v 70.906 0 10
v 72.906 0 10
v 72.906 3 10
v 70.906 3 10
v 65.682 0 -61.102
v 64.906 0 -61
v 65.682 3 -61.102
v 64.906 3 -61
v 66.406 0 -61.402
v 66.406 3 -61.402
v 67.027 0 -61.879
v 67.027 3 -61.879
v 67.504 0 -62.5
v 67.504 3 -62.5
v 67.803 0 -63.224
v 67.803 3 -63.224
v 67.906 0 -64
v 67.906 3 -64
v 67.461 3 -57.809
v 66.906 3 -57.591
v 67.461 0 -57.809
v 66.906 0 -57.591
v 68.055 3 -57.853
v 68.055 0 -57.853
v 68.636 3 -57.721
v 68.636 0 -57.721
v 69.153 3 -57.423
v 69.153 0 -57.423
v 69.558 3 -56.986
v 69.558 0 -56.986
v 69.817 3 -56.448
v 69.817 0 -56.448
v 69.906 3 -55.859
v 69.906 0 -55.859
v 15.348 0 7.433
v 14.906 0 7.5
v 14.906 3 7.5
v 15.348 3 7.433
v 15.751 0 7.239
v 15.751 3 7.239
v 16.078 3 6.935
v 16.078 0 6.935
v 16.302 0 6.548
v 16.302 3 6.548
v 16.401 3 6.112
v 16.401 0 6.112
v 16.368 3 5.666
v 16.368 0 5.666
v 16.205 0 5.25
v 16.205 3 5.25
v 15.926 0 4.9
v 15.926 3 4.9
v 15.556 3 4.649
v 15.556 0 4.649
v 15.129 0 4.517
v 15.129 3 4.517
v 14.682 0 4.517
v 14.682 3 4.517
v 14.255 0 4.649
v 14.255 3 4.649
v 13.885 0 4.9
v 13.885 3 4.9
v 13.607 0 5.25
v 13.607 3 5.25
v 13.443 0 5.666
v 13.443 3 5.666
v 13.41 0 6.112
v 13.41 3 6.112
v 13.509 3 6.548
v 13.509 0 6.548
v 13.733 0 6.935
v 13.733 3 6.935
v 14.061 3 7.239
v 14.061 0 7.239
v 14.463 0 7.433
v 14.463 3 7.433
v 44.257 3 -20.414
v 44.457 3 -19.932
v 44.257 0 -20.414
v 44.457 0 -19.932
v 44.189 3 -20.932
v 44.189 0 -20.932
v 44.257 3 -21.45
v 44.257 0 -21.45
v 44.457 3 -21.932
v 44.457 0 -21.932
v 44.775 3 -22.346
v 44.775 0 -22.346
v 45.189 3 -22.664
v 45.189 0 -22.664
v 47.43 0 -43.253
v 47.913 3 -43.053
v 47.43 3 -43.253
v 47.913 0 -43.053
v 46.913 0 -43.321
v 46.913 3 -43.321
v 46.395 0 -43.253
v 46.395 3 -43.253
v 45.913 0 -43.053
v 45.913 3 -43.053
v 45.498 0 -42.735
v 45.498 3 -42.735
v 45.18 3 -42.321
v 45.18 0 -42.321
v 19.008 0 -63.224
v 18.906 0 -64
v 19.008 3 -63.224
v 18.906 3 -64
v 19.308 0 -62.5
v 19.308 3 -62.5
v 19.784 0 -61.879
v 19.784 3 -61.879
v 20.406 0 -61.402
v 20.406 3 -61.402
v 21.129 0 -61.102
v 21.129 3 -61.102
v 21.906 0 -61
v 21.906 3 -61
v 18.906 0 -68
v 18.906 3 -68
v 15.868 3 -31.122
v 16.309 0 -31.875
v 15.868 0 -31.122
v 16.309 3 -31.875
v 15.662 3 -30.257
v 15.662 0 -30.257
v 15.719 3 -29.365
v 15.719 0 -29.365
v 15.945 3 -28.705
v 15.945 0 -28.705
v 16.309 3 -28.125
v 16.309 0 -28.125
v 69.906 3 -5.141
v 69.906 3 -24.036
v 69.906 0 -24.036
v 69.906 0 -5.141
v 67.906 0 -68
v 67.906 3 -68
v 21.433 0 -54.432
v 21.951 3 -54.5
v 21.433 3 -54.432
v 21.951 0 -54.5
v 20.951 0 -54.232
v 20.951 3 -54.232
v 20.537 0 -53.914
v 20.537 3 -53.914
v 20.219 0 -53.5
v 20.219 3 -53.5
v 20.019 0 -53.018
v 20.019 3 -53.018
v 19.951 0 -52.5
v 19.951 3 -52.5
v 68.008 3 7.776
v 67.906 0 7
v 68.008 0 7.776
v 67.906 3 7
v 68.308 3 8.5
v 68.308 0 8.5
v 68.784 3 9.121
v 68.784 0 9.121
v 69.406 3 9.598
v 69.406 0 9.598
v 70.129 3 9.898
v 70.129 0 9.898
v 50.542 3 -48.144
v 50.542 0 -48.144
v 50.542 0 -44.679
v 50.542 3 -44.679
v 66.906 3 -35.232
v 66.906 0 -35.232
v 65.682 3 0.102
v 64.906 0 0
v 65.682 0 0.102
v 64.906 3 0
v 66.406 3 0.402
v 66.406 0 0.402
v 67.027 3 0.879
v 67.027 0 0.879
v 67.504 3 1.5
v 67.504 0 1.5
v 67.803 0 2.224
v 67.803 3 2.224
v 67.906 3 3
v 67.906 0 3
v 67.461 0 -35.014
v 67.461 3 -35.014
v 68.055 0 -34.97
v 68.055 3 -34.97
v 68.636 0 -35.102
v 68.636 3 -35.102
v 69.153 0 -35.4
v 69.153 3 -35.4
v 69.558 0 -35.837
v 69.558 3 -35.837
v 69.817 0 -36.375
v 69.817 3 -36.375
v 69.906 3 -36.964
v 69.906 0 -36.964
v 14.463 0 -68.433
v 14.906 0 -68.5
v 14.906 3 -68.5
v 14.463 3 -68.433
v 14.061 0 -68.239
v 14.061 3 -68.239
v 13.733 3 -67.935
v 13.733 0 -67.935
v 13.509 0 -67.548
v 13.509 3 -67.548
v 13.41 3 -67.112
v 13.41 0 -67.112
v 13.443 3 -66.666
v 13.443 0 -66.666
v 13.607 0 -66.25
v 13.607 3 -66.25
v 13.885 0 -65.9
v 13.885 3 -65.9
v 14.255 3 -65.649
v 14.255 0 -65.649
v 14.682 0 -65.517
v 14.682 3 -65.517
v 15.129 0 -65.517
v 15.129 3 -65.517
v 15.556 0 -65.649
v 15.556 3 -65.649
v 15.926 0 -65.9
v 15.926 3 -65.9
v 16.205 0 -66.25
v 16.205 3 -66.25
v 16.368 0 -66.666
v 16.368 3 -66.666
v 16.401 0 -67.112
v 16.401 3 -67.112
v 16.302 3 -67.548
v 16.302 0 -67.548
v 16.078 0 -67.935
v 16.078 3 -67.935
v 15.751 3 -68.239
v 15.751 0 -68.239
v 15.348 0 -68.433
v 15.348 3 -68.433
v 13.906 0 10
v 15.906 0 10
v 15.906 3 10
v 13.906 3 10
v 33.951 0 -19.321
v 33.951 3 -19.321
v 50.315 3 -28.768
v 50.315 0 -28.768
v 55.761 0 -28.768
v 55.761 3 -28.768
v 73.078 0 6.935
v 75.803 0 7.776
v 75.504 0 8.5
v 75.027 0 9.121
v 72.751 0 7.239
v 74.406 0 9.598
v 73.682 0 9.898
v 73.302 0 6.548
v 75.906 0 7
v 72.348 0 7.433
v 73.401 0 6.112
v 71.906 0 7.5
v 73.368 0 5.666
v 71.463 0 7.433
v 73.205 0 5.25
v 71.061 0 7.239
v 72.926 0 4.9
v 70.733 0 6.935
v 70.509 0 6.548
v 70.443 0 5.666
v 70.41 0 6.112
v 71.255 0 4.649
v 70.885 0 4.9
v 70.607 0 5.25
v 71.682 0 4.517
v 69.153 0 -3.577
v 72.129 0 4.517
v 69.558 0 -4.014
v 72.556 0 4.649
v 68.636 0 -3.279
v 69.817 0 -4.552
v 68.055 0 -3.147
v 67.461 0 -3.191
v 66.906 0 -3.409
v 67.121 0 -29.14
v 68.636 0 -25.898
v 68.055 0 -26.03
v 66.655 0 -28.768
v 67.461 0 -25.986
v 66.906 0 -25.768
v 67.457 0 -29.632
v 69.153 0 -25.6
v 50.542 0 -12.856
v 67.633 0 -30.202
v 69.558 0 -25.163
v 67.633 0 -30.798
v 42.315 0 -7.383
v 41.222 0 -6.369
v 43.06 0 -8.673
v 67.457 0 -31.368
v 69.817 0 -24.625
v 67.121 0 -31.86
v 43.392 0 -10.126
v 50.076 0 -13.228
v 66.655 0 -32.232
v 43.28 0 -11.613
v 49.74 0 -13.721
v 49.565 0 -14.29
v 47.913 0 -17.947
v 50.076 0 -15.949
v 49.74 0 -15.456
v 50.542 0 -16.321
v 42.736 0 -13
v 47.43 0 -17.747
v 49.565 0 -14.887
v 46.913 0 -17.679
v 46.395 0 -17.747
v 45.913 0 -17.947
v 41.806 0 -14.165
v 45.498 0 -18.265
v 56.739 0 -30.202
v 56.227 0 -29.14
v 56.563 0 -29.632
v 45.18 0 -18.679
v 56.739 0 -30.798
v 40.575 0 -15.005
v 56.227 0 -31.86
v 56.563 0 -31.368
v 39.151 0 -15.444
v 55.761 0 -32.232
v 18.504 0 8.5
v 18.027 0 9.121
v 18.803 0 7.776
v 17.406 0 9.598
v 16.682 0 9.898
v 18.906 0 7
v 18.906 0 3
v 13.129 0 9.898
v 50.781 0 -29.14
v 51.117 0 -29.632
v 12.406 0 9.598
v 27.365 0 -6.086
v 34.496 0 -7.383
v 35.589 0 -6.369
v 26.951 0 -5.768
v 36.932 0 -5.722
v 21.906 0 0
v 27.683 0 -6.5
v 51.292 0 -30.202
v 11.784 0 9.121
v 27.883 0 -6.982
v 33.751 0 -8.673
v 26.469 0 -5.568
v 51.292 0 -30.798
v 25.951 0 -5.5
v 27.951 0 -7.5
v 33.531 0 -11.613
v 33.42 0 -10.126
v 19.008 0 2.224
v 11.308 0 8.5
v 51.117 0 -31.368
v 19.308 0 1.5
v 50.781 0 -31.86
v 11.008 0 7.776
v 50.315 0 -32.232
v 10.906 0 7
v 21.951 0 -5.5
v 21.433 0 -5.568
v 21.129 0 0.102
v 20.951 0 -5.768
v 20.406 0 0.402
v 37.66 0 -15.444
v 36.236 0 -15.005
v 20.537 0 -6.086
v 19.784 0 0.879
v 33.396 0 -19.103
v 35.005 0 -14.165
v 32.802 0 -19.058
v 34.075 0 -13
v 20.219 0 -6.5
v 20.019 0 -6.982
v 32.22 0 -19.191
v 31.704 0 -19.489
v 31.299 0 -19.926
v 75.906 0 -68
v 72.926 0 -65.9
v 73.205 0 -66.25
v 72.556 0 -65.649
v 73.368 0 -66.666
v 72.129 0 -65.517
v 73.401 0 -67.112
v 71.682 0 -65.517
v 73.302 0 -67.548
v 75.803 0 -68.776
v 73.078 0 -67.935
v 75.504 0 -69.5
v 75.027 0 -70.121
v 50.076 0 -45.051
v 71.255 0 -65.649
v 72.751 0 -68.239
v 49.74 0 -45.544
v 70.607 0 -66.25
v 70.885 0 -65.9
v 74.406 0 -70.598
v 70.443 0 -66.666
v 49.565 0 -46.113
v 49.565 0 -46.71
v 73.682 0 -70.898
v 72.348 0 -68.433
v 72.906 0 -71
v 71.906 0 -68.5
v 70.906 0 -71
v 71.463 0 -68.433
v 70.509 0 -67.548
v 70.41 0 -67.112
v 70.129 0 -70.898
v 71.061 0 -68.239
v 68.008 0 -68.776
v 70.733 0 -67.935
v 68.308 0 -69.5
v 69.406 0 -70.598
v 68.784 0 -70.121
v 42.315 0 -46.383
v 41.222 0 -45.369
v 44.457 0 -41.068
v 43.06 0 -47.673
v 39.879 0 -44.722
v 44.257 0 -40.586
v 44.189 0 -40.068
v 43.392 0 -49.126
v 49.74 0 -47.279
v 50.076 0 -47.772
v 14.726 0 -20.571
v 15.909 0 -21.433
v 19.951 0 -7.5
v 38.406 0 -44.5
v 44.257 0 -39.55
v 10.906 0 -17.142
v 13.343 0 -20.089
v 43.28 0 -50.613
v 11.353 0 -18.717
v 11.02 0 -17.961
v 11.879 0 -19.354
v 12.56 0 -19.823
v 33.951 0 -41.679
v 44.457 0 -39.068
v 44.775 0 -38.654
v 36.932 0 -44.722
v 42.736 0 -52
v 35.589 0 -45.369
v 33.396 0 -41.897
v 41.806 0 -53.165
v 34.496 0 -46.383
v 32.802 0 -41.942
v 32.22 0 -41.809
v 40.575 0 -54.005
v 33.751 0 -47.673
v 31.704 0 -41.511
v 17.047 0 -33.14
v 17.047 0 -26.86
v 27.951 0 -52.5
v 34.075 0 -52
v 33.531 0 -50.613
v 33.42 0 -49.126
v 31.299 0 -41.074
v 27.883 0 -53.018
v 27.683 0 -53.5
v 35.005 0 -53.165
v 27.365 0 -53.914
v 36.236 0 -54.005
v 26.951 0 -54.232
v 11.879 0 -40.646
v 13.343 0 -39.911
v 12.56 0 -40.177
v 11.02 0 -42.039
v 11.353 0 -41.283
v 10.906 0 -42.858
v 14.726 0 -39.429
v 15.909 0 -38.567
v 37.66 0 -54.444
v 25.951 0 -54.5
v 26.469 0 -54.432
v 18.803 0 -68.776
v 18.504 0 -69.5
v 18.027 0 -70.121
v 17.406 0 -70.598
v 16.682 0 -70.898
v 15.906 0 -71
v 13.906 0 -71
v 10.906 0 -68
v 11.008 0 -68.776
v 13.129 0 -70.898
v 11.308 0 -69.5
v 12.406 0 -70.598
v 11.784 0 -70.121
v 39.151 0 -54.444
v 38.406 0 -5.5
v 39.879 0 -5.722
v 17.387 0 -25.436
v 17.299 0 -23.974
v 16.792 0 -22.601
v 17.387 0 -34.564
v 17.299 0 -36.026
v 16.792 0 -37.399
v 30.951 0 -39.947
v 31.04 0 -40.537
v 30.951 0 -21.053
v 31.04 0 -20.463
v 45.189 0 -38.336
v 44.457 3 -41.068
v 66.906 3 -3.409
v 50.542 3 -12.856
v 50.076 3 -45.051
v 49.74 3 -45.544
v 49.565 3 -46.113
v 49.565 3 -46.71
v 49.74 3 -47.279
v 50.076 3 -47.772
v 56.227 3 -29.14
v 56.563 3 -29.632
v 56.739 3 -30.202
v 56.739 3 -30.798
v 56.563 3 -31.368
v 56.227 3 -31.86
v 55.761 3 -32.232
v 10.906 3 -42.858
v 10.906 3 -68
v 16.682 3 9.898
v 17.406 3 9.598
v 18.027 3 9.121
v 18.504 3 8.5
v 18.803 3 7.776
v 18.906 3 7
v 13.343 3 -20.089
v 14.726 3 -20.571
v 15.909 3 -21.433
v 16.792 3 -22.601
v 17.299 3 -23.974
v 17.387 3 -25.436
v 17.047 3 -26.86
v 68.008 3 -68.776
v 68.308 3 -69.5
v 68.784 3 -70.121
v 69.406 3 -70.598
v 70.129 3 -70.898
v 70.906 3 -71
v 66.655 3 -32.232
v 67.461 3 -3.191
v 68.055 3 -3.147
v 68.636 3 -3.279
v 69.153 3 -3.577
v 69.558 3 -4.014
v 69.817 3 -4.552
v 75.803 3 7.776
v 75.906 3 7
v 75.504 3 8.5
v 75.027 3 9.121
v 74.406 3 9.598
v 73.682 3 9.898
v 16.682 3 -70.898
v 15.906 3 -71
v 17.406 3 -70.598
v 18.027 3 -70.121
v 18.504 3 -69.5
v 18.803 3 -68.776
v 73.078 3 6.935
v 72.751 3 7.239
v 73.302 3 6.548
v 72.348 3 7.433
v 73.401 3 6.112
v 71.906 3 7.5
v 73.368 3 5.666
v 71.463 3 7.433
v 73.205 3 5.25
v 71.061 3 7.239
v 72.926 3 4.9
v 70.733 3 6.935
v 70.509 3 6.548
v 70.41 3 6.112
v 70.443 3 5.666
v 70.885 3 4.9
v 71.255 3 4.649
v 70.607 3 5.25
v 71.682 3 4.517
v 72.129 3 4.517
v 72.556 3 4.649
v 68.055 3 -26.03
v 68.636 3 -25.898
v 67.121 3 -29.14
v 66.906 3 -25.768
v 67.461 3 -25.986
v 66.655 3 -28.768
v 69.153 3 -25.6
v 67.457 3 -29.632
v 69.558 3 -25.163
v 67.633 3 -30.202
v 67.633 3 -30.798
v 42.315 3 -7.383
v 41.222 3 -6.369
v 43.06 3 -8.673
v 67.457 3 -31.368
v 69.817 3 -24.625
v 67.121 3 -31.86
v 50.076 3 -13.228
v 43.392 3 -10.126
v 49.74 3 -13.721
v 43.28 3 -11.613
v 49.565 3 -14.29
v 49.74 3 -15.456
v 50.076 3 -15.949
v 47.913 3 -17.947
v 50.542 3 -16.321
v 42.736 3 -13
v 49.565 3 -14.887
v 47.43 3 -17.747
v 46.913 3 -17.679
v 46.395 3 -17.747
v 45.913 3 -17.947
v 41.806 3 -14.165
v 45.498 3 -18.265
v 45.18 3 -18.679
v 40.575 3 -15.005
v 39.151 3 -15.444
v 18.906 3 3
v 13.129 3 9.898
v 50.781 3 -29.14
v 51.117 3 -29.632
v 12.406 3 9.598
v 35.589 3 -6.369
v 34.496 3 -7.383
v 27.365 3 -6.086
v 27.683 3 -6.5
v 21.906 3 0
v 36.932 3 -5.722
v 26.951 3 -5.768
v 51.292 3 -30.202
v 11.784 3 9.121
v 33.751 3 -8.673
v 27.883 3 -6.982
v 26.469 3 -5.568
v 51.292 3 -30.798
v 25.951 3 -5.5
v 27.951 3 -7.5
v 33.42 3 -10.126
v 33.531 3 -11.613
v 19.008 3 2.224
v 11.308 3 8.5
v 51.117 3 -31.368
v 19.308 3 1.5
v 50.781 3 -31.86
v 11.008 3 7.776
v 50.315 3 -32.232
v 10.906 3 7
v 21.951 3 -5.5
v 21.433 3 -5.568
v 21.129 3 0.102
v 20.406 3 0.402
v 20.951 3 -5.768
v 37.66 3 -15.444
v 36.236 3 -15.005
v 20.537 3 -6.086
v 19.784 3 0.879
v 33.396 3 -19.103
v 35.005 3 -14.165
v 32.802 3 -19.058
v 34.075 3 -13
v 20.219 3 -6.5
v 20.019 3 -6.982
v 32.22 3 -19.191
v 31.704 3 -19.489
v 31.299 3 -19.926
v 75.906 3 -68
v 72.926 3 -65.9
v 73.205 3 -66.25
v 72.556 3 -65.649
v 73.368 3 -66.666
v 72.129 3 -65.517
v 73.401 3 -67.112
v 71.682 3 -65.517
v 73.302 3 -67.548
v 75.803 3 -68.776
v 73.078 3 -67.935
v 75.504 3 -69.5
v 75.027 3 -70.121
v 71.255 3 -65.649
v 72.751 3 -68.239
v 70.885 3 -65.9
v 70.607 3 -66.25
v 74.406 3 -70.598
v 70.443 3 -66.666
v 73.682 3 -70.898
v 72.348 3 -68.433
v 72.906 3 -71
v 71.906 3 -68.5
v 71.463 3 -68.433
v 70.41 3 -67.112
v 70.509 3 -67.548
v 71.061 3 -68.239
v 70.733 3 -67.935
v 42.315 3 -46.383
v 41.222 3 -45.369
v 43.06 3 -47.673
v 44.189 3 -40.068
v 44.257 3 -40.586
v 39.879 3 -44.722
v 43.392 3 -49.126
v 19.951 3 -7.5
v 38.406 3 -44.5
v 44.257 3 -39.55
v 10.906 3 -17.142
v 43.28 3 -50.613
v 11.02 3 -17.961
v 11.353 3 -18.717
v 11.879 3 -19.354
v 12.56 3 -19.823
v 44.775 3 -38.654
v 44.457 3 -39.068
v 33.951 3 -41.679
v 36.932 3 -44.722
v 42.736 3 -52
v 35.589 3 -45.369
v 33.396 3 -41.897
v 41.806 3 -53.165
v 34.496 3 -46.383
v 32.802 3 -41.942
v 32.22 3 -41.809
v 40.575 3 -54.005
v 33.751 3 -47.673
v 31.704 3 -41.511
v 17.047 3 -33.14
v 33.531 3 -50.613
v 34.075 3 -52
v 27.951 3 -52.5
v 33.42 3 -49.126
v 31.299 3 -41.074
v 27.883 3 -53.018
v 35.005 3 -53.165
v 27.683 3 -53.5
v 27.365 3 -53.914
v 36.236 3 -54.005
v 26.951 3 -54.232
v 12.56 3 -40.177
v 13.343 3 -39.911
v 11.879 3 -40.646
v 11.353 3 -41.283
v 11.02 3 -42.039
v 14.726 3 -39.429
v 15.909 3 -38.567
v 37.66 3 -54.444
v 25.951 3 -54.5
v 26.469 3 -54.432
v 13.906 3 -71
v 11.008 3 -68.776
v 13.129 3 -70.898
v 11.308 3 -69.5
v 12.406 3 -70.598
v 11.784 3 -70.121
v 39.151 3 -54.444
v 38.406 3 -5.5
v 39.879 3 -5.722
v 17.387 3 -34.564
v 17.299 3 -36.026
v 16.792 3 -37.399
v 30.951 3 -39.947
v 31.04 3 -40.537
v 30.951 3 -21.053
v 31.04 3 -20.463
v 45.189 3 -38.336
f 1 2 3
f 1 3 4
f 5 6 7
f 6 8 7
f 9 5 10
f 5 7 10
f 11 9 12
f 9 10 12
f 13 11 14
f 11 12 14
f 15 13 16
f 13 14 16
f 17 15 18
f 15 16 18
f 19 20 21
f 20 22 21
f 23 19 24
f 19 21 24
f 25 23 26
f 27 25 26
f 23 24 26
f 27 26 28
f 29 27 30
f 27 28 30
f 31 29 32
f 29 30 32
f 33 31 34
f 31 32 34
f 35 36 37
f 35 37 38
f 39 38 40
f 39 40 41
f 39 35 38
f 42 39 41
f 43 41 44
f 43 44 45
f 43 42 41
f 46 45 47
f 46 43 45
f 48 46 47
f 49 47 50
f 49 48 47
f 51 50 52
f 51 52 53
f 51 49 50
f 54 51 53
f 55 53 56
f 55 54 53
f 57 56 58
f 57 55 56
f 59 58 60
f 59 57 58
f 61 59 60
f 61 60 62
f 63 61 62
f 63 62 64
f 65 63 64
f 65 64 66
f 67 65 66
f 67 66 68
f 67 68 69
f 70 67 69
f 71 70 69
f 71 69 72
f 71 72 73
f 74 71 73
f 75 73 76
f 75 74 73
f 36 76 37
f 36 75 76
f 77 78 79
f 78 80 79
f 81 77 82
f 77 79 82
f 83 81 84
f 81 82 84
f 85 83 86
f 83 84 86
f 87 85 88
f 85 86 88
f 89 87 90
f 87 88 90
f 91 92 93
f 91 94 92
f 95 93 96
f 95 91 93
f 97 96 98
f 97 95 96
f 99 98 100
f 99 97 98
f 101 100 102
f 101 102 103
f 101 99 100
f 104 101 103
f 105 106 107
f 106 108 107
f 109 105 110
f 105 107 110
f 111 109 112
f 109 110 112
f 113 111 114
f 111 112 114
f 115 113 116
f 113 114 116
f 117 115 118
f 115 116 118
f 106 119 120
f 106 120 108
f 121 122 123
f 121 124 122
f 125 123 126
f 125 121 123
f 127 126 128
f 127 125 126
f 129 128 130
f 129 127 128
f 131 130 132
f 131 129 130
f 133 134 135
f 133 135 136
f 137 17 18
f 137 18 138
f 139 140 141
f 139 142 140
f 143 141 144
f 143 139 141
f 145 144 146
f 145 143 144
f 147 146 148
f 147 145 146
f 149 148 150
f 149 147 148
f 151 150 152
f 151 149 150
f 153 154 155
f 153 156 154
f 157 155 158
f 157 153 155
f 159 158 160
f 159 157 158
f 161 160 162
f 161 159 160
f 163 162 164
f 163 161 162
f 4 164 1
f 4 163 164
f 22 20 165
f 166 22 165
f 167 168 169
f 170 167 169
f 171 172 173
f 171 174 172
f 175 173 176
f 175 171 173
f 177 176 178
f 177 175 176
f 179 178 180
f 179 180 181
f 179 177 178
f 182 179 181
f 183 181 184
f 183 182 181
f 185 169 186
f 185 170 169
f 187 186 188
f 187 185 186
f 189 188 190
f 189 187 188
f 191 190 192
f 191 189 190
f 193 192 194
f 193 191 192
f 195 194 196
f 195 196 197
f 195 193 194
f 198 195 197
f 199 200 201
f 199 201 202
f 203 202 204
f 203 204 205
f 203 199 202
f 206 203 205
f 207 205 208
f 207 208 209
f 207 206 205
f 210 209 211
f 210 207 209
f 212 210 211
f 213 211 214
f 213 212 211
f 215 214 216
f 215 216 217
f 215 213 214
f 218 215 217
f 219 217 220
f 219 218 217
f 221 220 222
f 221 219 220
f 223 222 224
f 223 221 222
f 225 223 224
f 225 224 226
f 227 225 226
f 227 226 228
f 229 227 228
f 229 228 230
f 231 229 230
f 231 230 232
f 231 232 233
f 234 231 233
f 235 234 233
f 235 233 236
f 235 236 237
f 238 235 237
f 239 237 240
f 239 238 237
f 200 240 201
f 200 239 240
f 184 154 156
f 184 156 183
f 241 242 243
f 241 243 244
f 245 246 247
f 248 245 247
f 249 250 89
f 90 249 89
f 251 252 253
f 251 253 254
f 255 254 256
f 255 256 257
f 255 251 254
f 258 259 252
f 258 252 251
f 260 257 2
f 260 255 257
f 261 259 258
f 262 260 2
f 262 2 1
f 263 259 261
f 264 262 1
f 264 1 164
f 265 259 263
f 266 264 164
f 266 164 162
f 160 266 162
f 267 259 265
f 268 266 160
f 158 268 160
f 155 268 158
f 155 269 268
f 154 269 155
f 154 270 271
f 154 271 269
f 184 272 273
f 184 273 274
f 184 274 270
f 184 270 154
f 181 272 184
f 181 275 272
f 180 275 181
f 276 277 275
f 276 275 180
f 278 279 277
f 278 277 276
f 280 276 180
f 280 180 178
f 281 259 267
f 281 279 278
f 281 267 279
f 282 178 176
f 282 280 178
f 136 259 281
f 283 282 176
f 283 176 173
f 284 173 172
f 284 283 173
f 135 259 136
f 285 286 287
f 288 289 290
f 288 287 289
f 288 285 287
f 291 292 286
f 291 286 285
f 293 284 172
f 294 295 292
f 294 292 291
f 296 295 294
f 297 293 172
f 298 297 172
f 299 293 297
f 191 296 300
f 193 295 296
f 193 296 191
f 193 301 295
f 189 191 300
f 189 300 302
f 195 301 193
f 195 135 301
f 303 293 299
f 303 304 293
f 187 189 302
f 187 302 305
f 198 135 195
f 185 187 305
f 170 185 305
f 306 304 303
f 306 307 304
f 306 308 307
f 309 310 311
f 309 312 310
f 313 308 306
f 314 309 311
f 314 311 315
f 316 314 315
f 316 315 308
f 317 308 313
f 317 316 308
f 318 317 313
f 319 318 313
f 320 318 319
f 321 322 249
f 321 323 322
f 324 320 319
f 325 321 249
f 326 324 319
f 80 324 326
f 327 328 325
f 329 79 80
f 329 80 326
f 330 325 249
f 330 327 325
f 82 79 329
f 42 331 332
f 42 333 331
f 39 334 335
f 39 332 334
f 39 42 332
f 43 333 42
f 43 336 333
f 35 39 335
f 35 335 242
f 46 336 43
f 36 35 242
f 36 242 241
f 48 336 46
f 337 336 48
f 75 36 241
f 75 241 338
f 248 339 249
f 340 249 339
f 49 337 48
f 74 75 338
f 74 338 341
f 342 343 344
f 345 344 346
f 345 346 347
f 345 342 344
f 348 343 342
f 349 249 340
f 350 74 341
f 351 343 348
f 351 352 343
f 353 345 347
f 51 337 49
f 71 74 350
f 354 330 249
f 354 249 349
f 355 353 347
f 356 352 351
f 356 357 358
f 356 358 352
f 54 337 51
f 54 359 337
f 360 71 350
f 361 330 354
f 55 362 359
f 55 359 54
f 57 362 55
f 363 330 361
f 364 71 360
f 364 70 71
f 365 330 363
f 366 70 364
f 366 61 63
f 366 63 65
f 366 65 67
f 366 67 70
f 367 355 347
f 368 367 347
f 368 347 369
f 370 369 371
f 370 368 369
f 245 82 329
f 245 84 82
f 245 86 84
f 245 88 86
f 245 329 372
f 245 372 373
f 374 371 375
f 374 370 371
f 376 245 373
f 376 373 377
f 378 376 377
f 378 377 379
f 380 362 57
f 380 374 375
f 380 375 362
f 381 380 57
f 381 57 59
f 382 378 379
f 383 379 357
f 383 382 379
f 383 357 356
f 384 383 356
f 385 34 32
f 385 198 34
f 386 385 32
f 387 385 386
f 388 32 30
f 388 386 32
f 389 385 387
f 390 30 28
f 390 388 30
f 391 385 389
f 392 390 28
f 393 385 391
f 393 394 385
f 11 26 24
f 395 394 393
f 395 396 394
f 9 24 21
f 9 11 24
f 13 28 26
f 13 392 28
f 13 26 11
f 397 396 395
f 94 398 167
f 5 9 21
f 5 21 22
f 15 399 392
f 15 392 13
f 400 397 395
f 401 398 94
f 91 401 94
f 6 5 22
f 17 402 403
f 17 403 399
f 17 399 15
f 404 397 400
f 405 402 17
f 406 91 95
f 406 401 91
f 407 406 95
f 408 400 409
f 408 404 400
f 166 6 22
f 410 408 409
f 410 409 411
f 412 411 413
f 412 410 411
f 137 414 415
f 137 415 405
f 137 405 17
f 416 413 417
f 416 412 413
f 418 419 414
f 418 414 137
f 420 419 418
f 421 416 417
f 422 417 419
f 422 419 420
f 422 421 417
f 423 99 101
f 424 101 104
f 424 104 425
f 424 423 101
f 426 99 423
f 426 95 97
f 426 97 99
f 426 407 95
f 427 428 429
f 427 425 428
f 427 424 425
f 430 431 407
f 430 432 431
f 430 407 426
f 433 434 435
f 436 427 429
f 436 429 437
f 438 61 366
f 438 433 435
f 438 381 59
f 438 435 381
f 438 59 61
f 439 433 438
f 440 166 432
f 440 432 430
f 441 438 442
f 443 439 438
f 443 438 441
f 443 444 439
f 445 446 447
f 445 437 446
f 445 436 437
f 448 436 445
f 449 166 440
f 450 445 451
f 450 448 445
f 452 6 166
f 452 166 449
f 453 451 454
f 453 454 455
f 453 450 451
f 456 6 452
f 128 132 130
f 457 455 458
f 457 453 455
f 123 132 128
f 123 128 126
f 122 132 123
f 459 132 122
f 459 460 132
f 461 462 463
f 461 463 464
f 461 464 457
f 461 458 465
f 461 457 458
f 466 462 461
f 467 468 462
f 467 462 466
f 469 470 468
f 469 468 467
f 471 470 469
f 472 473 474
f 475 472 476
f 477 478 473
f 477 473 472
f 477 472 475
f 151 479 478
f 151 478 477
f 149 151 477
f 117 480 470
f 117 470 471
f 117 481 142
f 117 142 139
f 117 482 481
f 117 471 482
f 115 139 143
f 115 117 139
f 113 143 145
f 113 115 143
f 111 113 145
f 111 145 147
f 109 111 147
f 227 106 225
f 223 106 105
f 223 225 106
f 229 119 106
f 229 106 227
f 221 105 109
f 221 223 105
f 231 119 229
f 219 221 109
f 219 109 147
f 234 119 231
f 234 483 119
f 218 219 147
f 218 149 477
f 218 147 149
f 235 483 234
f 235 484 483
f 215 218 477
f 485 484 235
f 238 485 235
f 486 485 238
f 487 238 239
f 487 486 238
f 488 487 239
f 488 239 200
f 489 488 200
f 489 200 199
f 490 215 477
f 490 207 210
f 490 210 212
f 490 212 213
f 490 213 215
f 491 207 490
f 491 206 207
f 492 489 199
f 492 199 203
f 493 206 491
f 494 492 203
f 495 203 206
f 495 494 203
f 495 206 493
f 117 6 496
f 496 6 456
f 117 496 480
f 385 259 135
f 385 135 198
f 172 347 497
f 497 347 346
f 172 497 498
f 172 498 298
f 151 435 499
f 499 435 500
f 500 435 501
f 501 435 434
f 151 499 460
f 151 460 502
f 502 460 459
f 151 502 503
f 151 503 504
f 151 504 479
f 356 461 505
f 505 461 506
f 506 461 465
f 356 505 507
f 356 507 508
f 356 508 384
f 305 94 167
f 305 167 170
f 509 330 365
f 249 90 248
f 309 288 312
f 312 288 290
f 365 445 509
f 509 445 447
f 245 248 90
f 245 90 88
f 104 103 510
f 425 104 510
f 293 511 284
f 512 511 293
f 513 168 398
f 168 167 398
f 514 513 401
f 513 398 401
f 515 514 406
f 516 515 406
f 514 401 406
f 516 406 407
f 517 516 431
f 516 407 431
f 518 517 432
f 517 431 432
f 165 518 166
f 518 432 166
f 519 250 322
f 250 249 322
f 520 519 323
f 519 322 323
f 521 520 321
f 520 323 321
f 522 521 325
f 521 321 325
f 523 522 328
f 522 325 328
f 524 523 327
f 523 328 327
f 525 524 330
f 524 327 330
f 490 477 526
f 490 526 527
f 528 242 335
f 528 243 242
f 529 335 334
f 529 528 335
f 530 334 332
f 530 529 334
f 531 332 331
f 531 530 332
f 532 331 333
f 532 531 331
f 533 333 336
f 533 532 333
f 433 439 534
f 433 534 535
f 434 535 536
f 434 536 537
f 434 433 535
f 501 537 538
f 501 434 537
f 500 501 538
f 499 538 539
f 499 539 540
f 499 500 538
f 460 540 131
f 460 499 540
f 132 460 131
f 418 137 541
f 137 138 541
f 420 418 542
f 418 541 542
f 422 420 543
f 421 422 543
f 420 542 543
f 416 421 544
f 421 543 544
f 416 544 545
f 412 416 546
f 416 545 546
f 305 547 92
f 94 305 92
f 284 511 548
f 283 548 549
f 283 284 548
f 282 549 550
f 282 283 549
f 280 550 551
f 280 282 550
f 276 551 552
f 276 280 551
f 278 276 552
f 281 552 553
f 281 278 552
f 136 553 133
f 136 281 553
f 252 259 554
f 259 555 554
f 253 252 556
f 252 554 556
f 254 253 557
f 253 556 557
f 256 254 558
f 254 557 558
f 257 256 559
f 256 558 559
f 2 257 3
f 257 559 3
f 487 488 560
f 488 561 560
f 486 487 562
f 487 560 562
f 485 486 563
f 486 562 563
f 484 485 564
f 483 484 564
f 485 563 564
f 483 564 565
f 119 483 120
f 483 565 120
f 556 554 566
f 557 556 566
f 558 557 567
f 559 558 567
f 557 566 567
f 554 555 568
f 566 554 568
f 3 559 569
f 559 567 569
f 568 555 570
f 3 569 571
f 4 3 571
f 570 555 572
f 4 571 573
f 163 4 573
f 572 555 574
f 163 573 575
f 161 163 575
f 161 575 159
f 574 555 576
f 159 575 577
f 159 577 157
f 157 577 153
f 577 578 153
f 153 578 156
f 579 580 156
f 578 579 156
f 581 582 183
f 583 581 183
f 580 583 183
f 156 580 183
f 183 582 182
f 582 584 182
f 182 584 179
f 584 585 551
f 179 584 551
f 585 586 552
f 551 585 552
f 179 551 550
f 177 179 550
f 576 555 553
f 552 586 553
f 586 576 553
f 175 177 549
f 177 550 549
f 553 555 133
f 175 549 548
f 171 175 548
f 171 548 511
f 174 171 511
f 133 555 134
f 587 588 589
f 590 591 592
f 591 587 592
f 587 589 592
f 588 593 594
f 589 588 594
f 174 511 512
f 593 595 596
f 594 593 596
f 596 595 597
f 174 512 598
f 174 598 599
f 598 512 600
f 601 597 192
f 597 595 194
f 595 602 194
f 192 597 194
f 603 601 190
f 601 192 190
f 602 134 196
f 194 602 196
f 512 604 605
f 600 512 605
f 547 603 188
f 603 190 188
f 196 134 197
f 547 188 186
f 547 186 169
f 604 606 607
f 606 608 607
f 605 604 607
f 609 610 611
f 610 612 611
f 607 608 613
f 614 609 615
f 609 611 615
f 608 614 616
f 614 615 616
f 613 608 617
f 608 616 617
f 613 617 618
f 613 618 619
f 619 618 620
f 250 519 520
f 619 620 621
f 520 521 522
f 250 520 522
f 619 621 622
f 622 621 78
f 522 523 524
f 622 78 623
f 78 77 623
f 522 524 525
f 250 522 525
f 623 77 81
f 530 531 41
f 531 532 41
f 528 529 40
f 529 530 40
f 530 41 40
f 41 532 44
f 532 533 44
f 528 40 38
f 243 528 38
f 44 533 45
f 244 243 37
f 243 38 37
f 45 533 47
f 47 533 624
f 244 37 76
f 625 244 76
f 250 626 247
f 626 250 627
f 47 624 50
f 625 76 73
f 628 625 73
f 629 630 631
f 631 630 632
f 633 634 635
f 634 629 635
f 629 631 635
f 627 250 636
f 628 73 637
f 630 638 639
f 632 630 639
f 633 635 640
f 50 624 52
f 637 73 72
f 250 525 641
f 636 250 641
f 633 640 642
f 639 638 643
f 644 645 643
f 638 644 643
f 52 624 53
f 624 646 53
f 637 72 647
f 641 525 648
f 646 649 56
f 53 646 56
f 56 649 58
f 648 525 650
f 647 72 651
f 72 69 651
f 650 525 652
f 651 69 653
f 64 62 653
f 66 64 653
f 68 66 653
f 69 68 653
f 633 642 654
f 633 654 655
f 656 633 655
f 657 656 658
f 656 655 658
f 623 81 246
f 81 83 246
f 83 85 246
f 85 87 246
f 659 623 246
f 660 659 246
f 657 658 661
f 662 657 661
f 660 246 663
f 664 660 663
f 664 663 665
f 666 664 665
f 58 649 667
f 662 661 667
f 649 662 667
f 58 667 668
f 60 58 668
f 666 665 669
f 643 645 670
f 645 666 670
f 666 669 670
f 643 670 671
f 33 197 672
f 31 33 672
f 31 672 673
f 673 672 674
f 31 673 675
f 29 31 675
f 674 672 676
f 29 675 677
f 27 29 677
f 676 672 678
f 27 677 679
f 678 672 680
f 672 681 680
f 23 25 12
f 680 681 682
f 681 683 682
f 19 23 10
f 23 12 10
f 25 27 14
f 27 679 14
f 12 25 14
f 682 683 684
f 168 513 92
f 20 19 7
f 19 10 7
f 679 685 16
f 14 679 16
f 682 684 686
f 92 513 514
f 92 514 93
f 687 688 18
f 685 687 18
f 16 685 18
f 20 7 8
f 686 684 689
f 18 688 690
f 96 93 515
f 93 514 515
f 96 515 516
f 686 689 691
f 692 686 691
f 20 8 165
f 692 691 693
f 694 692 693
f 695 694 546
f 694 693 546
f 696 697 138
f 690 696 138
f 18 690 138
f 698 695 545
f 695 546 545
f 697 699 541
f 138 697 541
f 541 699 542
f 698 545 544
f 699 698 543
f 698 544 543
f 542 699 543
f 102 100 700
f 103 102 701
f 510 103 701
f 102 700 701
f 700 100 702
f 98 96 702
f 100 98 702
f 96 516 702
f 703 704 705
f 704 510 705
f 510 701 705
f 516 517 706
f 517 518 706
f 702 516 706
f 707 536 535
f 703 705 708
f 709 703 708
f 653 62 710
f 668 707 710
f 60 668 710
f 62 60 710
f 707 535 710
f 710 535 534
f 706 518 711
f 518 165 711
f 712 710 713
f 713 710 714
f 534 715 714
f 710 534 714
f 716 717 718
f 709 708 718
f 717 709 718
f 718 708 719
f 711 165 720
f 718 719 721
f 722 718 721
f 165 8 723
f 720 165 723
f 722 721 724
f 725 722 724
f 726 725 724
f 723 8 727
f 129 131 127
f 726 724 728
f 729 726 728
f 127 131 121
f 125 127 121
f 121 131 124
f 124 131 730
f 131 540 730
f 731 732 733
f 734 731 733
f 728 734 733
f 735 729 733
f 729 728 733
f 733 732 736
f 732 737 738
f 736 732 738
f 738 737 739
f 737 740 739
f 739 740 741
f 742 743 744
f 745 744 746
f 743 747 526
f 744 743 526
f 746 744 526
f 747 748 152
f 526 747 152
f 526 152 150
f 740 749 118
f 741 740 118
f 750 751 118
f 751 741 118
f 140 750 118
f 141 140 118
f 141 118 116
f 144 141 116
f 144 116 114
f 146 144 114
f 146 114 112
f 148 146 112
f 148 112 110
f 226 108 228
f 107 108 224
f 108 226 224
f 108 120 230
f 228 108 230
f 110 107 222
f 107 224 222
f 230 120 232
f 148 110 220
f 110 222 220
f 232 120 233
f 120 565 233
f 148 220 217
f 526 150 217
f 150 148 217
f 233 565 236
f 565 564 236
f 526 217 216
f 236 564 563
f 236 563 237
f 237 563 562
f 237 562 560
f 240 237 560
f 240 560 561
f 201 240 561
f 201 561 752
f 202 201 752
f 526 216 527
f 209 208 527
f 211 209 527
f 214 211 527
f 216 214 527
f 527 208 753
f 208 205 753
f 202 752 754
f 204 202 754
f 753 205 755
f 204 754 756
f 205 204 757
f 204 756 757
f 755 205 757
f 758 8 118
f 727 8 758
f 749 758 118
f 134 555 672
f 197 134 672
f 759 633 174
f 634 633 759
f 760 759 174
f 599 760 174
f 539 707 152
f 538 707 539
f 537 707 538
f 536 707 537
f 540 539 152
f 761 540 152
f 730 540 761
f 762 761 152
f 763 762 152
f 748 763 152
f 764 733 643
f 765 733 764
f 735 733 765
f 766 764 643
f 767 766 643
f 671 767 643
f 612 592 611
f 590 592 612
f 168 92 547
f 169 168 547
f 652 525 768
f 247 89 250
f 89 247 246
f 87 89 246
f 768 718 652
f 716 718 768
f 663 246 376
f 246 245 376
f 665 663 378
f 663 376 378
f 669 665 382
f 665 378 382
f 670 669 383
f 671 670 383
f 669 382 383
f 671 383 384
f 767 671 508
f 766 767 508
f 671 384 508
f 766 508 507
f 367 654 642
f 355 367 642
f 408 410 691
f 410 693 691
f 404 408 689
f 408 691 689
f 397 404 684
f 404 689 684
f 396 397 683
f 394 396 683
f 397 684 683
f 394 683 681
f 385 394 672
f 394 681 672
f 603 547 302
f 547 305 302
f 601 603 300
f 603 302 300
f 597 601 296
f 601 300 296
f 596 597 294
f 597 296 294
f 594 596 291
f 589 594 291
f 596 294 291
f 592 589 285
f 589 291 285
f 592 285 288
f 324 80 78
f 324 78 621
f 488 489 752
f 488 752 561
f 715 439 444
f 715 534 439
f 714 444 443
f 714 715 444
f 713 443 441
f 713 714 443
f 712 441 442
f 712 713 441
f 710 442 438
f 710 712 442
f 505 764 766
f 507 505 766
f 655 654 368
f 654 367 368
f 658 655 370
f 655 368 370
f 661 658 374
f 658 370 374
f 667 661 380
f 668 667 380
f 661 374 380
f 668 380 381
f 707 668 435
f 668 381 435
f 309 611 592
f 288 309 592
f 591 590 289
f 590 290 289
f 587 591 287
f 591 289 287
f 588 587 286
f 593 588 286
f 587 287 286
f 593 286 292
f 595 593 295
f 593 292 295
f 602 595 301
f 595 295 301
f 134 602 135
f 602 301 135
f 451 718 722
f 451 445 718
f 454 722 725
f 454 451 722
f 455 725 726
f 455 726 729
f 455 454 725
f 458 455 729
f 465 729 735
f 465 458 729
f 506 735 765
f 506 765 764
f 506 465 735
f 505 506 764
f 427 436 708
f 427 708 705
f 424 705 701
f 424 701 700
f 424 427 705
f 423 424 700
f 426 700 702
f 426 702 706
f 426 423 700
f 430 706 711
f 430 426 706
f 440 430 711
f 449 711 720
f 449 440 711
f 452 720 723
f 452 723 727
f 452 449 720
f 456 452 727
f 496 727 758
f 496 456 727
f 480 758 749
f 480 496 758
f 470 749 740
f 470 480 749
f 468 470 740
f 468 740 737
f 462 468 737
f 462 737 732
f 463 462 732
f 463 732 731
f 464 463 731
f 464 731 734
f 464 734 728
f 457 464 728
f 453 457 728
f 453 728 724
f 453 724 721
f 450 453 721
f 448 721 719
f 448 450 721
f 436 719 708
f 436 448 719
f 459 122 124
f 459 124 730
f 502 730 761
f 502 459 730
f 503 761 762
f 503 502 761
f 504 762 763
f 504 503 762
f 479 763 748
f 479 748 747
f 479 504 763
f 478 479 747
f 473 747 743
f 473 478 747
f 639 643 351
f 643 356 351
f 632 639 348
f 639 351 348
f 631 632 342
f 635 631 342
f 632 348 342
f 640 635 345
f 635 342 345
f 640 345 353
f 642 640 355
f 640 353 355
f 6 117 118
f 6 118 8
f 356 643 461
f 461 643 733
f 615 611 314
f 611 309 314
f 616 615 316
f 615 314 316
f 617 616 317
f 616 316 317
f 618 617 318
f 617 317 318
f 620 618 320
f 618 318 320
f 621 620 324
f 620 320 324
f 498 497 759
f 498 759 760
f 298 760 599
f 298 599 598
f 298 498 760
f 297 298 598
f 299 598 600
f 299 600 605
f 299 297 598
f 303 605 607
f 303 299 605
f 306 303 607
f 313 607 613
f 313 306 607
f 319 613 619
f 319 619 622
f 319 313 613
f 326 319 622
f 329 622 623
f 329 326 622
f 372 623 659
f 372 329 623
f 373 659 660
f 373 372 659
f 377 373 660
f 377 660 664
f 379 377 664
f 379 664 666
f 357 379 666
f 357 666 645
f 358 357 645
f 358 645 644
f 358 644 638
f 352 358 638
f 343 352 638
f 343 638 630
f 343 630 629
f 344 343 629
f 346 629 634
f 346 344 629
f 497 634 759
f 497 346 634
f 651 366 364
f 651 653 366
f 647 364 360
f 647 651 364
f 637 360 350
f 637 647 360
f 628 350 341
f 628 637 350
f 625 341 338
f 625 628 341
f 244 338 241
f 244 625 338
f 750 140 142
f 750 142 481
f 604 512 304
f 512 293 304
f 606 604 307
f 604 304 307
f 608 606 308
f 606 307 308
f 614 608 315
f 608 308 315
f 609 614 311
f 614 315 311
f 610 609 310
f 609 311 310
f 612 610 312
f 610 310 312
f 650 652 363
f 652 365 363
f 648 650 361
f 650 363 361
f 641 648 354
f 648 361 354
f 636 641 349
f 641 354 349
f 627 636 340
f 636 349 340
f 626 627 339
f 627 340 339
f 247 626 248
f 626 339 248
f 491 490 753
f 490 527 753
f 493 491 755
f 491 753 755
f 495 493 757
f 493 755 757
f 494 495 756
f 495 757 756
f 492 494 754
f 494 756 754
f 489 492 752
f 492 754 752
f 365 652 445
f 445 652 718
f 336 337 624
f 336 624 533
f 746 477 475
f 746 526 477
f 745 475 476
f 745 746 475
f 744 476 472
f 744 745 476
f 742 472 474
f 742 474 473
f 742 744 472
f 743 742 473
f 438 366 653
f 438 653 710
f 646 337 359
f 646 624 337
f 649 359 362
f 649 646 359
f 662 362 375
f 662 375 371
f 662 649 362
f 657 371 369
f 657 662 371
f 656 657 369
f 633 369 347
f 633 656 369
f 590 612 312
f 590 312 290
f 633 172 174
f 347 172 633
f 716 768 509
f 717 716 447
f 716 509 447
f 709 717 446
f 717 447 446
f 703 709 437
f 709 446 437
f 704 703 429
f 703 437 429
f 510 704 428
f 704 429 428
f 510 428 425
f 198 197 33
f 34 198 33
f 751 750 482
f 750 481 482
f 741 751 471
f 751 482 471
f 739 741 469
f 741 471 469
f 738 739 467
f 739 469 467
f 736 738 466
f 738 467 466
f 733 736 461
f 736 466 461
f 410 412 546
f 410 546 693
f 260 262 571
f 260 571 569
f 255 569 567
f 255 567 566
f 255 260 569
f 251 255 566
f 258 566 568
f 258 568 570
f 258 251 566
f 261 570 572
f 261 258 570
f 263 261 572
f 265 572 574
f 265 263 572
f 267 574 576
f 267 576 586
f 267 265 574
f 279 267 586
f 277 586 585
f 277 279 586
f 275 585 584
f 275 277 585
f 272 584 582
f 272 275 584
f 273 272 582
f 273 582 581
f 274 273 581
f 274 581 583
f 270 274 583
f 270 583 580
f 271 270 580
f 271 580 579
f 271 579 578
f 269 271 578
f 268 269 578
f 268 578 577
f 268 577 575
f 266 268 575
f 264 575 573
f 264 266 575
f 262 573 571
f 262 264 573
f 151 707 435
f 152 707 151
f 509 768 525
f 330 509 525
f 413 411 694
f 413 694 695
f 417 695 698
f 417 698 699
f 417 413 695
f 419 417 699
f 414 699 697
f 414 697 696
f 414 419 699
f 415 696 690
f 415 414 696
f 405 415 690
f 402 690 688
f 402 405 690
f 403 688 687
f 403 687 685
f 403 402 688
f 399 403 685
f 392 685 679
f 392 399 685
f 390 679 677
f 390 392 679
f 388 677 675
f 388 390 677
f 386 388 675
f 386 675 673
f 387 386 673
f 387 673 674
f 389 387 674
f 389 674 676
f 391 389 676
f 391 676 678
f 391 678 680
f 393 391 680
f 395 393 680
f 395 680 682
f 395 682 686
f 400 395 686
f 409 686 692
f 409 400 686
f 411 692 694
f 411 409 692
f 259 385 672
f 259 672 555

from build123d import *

# Parameters (mm, degrees)
SKETCH1_R           = 5
SKETCH1_R_2         = 1.5
BOSS_EXTRUDE1_DEPTH = 3
FILLET1_R           = 3
SKETCH2_W           = 8
SKETCH2_H           = 49
CUT_EXTRUDE1_DEPTH  = 104.979147454
FILLET2_R           = 2


with BuildPart() as part:
    # Sketch1 → Boss-Extrude1 (new body)
    with BuildSketch(Plane(origin=(0, 0, 0), x_dir=(1, 0, 0), z_dir=(0, 1, 0))):
        with BuildLine():
            Line((10.905619524, 39.769696007), (10.905619524, 61))
            Line((10.905619524, 61), (10.905619524, 71))
            Line((10.905619524, 71), (18.905619524, 71))
            Line((18.905619524, 71), (18.905619524, 61))
            Line((18.905619524, 61), (67.905619524, 61))
            Line((67.905619524, 61), (67.905619524, 71))
            Line((67.905619524, 71), (75.905619524, 71))
            Line((75.905619524, 71), (75.905619524, 61))
            Line((75.905619524, 61), (75.905619524, 0))
            Line((75.905619524, 0), (75.905619524, -10))
            Line((75.905619524, -10), (67.905619524, -10))
            Line((67.905619524, -10), (67.905619524, 0))
            Line((67.905619524, 0), (18.905619524, 0))
            Line((18.905619524, 0), (18.905619524, -10))
            Line((18.905619524, -10), (10.905619524, -10))
            Line((10.905619524, -10), (10.905619524, 0))
            Line((10.905619524, 0), (10.905619524, 20.230303993))
            ThreePointArc((10.905619524, 20.230303993), (17.347708153, 24.241211504), (12.405619524, 30))
            ThreePointArc((12.405619524, 30), (17.347708153, 35.758788496), (10.905619524, 39.769696007))
        make_face()
        with Locations(Location((38.405619524, 10.5, 0), (0, 0, 270))):
            Circle(SKETCH1_R, mode=Mode.SUBTRACT)
        with Locations(Location((38.405619524, 49.5, 0), (0, 0, 270))):
            Circle(SKETCH1_R, mode=Mode.SUBTRACT)
        with Locations(Location((14.905619524, -6, 0), (0, 0, 270))):
            Circle(SKETCH1_R_2, mode=Mode.SUBTRACT)
        with Locations(Location((14.905619524, 67, 0), (0, 0, 90))):
            Circle(SKETCH1_R_2, mode=Mode.SUBTRACT)
        with Locations(Location((71.905619524, -6, 0), (0, 0, 270))):
            Circle(SKETCH1_R_2, mode=Mode.SUBTRACT)
        with Locations(Location((71.905619524, 67, 0), (0, 0, 90))):
            Circle(SKETCH1_R_2, mode=Mode.SUBTRACT)
    extrude(amount=BOSS_EXTRUDE1_DEPTH)

    # Fillet1
    fillet1_edges = [part.edges().sort_by_distance(p)[0] for p in [
        (10.905619524, 1.5, -20.230303993),
        (12.405619524, 1.5, -30),
        (10.905619524, 1.5, -39.769696007),
        (10.905619524, 1.5, -71),
        (18.905619524, 1.5, -71),
        (18.905619524, 1.5, -61),
        (67.905619524, 1.5, -61),
        (67.905619524, 1.5, -71),
        (75.905619524, 1.5, -71),
        (75.905619524, 1.5, 10),
        (67.905619524, 1.5, 10),
        (67.905619524, 1.5, 0),
        (18.905619524, 1.5, 0),
        (18.905619524, 1.5, 10),
        (10.905619524, 1.5, 10),
    ]]
    fillet(fillet1_edges, radius=FILLET1_R)

    # Sketch2 → Cut-Extrude1 (cut, through all)
    with BuildSketch(Plane(origin=(0, 3, 0), x_dir=(1, 0, 0), z_dir=(0, 1, 0))):
        Polygon((53.314584868, 30.5), (30.951136852, 43.411542732), (30.951136852, 17.588457268), align=None)
        Polygon((69.905619524, 27.5), (69.905619524, 1.676914536), (47.542171508, 14.588457268), align=None)
        Polygon((47.542171508, 46.411542732), (69.905619524, 33.5), (69.905619524, 59.323085464), align=None)
        Polygon((69.654975177, 30.5), (46.180472316, 44.053010546), (43.457073931, 39.335946174), (58.761381637, 30.5), (43.457073931, 21.664053826), (46.180472316, 16.946989454), align=None)
        with Locations((23.951136852, 30)):
            Rectangle(SKETCH2_W, SKETCH2_H)
    extrude(amount=-CUT_EXTRUDE1_DEPTH, mode=Mode.SUBTRACT)

    # Fillet2
    fillet2_edges = [part.edges().sort_by_distance(p)[0] for p in [
        (53.314584868, 1.5, -30.5),
        (30.951136852, 1.5, -17.588457268),
        (30.951136852, 1.5, -43.411542732),
        (47.542171508, 1.5, -14.588457268),
        (69.905619524, 1.5, -27.5),
        (69.905619524, 1.5, -1.676914536),
        (47.542171508, 1.5, -46.411542732),
        (69.905619524, 1.5, -59.323085464),
        (69.905619524, 1.5, -33.5),
        (43.457073931, 1.5, -39.335946174),
        (46.180472316, 1.5, -44.053010546),
        (69.654975177, 1.5, -30.5),
        (46.180472316, 1.5, -16.946989454),
        (43.457073931, 1.5, -21.664053826),
        (58.761381637, 1.5, -30.5),
        (27.951136852, 1.5, -54.5),
        (27.951136852, 1.5, -5.5),
        (19.951136852, 1.5, -5.5),
        (19.951136852, 1.5, -54.5),
    ]]
    fillet(fillet2_edges, radius=FILLET2_R)


solid = part.part
